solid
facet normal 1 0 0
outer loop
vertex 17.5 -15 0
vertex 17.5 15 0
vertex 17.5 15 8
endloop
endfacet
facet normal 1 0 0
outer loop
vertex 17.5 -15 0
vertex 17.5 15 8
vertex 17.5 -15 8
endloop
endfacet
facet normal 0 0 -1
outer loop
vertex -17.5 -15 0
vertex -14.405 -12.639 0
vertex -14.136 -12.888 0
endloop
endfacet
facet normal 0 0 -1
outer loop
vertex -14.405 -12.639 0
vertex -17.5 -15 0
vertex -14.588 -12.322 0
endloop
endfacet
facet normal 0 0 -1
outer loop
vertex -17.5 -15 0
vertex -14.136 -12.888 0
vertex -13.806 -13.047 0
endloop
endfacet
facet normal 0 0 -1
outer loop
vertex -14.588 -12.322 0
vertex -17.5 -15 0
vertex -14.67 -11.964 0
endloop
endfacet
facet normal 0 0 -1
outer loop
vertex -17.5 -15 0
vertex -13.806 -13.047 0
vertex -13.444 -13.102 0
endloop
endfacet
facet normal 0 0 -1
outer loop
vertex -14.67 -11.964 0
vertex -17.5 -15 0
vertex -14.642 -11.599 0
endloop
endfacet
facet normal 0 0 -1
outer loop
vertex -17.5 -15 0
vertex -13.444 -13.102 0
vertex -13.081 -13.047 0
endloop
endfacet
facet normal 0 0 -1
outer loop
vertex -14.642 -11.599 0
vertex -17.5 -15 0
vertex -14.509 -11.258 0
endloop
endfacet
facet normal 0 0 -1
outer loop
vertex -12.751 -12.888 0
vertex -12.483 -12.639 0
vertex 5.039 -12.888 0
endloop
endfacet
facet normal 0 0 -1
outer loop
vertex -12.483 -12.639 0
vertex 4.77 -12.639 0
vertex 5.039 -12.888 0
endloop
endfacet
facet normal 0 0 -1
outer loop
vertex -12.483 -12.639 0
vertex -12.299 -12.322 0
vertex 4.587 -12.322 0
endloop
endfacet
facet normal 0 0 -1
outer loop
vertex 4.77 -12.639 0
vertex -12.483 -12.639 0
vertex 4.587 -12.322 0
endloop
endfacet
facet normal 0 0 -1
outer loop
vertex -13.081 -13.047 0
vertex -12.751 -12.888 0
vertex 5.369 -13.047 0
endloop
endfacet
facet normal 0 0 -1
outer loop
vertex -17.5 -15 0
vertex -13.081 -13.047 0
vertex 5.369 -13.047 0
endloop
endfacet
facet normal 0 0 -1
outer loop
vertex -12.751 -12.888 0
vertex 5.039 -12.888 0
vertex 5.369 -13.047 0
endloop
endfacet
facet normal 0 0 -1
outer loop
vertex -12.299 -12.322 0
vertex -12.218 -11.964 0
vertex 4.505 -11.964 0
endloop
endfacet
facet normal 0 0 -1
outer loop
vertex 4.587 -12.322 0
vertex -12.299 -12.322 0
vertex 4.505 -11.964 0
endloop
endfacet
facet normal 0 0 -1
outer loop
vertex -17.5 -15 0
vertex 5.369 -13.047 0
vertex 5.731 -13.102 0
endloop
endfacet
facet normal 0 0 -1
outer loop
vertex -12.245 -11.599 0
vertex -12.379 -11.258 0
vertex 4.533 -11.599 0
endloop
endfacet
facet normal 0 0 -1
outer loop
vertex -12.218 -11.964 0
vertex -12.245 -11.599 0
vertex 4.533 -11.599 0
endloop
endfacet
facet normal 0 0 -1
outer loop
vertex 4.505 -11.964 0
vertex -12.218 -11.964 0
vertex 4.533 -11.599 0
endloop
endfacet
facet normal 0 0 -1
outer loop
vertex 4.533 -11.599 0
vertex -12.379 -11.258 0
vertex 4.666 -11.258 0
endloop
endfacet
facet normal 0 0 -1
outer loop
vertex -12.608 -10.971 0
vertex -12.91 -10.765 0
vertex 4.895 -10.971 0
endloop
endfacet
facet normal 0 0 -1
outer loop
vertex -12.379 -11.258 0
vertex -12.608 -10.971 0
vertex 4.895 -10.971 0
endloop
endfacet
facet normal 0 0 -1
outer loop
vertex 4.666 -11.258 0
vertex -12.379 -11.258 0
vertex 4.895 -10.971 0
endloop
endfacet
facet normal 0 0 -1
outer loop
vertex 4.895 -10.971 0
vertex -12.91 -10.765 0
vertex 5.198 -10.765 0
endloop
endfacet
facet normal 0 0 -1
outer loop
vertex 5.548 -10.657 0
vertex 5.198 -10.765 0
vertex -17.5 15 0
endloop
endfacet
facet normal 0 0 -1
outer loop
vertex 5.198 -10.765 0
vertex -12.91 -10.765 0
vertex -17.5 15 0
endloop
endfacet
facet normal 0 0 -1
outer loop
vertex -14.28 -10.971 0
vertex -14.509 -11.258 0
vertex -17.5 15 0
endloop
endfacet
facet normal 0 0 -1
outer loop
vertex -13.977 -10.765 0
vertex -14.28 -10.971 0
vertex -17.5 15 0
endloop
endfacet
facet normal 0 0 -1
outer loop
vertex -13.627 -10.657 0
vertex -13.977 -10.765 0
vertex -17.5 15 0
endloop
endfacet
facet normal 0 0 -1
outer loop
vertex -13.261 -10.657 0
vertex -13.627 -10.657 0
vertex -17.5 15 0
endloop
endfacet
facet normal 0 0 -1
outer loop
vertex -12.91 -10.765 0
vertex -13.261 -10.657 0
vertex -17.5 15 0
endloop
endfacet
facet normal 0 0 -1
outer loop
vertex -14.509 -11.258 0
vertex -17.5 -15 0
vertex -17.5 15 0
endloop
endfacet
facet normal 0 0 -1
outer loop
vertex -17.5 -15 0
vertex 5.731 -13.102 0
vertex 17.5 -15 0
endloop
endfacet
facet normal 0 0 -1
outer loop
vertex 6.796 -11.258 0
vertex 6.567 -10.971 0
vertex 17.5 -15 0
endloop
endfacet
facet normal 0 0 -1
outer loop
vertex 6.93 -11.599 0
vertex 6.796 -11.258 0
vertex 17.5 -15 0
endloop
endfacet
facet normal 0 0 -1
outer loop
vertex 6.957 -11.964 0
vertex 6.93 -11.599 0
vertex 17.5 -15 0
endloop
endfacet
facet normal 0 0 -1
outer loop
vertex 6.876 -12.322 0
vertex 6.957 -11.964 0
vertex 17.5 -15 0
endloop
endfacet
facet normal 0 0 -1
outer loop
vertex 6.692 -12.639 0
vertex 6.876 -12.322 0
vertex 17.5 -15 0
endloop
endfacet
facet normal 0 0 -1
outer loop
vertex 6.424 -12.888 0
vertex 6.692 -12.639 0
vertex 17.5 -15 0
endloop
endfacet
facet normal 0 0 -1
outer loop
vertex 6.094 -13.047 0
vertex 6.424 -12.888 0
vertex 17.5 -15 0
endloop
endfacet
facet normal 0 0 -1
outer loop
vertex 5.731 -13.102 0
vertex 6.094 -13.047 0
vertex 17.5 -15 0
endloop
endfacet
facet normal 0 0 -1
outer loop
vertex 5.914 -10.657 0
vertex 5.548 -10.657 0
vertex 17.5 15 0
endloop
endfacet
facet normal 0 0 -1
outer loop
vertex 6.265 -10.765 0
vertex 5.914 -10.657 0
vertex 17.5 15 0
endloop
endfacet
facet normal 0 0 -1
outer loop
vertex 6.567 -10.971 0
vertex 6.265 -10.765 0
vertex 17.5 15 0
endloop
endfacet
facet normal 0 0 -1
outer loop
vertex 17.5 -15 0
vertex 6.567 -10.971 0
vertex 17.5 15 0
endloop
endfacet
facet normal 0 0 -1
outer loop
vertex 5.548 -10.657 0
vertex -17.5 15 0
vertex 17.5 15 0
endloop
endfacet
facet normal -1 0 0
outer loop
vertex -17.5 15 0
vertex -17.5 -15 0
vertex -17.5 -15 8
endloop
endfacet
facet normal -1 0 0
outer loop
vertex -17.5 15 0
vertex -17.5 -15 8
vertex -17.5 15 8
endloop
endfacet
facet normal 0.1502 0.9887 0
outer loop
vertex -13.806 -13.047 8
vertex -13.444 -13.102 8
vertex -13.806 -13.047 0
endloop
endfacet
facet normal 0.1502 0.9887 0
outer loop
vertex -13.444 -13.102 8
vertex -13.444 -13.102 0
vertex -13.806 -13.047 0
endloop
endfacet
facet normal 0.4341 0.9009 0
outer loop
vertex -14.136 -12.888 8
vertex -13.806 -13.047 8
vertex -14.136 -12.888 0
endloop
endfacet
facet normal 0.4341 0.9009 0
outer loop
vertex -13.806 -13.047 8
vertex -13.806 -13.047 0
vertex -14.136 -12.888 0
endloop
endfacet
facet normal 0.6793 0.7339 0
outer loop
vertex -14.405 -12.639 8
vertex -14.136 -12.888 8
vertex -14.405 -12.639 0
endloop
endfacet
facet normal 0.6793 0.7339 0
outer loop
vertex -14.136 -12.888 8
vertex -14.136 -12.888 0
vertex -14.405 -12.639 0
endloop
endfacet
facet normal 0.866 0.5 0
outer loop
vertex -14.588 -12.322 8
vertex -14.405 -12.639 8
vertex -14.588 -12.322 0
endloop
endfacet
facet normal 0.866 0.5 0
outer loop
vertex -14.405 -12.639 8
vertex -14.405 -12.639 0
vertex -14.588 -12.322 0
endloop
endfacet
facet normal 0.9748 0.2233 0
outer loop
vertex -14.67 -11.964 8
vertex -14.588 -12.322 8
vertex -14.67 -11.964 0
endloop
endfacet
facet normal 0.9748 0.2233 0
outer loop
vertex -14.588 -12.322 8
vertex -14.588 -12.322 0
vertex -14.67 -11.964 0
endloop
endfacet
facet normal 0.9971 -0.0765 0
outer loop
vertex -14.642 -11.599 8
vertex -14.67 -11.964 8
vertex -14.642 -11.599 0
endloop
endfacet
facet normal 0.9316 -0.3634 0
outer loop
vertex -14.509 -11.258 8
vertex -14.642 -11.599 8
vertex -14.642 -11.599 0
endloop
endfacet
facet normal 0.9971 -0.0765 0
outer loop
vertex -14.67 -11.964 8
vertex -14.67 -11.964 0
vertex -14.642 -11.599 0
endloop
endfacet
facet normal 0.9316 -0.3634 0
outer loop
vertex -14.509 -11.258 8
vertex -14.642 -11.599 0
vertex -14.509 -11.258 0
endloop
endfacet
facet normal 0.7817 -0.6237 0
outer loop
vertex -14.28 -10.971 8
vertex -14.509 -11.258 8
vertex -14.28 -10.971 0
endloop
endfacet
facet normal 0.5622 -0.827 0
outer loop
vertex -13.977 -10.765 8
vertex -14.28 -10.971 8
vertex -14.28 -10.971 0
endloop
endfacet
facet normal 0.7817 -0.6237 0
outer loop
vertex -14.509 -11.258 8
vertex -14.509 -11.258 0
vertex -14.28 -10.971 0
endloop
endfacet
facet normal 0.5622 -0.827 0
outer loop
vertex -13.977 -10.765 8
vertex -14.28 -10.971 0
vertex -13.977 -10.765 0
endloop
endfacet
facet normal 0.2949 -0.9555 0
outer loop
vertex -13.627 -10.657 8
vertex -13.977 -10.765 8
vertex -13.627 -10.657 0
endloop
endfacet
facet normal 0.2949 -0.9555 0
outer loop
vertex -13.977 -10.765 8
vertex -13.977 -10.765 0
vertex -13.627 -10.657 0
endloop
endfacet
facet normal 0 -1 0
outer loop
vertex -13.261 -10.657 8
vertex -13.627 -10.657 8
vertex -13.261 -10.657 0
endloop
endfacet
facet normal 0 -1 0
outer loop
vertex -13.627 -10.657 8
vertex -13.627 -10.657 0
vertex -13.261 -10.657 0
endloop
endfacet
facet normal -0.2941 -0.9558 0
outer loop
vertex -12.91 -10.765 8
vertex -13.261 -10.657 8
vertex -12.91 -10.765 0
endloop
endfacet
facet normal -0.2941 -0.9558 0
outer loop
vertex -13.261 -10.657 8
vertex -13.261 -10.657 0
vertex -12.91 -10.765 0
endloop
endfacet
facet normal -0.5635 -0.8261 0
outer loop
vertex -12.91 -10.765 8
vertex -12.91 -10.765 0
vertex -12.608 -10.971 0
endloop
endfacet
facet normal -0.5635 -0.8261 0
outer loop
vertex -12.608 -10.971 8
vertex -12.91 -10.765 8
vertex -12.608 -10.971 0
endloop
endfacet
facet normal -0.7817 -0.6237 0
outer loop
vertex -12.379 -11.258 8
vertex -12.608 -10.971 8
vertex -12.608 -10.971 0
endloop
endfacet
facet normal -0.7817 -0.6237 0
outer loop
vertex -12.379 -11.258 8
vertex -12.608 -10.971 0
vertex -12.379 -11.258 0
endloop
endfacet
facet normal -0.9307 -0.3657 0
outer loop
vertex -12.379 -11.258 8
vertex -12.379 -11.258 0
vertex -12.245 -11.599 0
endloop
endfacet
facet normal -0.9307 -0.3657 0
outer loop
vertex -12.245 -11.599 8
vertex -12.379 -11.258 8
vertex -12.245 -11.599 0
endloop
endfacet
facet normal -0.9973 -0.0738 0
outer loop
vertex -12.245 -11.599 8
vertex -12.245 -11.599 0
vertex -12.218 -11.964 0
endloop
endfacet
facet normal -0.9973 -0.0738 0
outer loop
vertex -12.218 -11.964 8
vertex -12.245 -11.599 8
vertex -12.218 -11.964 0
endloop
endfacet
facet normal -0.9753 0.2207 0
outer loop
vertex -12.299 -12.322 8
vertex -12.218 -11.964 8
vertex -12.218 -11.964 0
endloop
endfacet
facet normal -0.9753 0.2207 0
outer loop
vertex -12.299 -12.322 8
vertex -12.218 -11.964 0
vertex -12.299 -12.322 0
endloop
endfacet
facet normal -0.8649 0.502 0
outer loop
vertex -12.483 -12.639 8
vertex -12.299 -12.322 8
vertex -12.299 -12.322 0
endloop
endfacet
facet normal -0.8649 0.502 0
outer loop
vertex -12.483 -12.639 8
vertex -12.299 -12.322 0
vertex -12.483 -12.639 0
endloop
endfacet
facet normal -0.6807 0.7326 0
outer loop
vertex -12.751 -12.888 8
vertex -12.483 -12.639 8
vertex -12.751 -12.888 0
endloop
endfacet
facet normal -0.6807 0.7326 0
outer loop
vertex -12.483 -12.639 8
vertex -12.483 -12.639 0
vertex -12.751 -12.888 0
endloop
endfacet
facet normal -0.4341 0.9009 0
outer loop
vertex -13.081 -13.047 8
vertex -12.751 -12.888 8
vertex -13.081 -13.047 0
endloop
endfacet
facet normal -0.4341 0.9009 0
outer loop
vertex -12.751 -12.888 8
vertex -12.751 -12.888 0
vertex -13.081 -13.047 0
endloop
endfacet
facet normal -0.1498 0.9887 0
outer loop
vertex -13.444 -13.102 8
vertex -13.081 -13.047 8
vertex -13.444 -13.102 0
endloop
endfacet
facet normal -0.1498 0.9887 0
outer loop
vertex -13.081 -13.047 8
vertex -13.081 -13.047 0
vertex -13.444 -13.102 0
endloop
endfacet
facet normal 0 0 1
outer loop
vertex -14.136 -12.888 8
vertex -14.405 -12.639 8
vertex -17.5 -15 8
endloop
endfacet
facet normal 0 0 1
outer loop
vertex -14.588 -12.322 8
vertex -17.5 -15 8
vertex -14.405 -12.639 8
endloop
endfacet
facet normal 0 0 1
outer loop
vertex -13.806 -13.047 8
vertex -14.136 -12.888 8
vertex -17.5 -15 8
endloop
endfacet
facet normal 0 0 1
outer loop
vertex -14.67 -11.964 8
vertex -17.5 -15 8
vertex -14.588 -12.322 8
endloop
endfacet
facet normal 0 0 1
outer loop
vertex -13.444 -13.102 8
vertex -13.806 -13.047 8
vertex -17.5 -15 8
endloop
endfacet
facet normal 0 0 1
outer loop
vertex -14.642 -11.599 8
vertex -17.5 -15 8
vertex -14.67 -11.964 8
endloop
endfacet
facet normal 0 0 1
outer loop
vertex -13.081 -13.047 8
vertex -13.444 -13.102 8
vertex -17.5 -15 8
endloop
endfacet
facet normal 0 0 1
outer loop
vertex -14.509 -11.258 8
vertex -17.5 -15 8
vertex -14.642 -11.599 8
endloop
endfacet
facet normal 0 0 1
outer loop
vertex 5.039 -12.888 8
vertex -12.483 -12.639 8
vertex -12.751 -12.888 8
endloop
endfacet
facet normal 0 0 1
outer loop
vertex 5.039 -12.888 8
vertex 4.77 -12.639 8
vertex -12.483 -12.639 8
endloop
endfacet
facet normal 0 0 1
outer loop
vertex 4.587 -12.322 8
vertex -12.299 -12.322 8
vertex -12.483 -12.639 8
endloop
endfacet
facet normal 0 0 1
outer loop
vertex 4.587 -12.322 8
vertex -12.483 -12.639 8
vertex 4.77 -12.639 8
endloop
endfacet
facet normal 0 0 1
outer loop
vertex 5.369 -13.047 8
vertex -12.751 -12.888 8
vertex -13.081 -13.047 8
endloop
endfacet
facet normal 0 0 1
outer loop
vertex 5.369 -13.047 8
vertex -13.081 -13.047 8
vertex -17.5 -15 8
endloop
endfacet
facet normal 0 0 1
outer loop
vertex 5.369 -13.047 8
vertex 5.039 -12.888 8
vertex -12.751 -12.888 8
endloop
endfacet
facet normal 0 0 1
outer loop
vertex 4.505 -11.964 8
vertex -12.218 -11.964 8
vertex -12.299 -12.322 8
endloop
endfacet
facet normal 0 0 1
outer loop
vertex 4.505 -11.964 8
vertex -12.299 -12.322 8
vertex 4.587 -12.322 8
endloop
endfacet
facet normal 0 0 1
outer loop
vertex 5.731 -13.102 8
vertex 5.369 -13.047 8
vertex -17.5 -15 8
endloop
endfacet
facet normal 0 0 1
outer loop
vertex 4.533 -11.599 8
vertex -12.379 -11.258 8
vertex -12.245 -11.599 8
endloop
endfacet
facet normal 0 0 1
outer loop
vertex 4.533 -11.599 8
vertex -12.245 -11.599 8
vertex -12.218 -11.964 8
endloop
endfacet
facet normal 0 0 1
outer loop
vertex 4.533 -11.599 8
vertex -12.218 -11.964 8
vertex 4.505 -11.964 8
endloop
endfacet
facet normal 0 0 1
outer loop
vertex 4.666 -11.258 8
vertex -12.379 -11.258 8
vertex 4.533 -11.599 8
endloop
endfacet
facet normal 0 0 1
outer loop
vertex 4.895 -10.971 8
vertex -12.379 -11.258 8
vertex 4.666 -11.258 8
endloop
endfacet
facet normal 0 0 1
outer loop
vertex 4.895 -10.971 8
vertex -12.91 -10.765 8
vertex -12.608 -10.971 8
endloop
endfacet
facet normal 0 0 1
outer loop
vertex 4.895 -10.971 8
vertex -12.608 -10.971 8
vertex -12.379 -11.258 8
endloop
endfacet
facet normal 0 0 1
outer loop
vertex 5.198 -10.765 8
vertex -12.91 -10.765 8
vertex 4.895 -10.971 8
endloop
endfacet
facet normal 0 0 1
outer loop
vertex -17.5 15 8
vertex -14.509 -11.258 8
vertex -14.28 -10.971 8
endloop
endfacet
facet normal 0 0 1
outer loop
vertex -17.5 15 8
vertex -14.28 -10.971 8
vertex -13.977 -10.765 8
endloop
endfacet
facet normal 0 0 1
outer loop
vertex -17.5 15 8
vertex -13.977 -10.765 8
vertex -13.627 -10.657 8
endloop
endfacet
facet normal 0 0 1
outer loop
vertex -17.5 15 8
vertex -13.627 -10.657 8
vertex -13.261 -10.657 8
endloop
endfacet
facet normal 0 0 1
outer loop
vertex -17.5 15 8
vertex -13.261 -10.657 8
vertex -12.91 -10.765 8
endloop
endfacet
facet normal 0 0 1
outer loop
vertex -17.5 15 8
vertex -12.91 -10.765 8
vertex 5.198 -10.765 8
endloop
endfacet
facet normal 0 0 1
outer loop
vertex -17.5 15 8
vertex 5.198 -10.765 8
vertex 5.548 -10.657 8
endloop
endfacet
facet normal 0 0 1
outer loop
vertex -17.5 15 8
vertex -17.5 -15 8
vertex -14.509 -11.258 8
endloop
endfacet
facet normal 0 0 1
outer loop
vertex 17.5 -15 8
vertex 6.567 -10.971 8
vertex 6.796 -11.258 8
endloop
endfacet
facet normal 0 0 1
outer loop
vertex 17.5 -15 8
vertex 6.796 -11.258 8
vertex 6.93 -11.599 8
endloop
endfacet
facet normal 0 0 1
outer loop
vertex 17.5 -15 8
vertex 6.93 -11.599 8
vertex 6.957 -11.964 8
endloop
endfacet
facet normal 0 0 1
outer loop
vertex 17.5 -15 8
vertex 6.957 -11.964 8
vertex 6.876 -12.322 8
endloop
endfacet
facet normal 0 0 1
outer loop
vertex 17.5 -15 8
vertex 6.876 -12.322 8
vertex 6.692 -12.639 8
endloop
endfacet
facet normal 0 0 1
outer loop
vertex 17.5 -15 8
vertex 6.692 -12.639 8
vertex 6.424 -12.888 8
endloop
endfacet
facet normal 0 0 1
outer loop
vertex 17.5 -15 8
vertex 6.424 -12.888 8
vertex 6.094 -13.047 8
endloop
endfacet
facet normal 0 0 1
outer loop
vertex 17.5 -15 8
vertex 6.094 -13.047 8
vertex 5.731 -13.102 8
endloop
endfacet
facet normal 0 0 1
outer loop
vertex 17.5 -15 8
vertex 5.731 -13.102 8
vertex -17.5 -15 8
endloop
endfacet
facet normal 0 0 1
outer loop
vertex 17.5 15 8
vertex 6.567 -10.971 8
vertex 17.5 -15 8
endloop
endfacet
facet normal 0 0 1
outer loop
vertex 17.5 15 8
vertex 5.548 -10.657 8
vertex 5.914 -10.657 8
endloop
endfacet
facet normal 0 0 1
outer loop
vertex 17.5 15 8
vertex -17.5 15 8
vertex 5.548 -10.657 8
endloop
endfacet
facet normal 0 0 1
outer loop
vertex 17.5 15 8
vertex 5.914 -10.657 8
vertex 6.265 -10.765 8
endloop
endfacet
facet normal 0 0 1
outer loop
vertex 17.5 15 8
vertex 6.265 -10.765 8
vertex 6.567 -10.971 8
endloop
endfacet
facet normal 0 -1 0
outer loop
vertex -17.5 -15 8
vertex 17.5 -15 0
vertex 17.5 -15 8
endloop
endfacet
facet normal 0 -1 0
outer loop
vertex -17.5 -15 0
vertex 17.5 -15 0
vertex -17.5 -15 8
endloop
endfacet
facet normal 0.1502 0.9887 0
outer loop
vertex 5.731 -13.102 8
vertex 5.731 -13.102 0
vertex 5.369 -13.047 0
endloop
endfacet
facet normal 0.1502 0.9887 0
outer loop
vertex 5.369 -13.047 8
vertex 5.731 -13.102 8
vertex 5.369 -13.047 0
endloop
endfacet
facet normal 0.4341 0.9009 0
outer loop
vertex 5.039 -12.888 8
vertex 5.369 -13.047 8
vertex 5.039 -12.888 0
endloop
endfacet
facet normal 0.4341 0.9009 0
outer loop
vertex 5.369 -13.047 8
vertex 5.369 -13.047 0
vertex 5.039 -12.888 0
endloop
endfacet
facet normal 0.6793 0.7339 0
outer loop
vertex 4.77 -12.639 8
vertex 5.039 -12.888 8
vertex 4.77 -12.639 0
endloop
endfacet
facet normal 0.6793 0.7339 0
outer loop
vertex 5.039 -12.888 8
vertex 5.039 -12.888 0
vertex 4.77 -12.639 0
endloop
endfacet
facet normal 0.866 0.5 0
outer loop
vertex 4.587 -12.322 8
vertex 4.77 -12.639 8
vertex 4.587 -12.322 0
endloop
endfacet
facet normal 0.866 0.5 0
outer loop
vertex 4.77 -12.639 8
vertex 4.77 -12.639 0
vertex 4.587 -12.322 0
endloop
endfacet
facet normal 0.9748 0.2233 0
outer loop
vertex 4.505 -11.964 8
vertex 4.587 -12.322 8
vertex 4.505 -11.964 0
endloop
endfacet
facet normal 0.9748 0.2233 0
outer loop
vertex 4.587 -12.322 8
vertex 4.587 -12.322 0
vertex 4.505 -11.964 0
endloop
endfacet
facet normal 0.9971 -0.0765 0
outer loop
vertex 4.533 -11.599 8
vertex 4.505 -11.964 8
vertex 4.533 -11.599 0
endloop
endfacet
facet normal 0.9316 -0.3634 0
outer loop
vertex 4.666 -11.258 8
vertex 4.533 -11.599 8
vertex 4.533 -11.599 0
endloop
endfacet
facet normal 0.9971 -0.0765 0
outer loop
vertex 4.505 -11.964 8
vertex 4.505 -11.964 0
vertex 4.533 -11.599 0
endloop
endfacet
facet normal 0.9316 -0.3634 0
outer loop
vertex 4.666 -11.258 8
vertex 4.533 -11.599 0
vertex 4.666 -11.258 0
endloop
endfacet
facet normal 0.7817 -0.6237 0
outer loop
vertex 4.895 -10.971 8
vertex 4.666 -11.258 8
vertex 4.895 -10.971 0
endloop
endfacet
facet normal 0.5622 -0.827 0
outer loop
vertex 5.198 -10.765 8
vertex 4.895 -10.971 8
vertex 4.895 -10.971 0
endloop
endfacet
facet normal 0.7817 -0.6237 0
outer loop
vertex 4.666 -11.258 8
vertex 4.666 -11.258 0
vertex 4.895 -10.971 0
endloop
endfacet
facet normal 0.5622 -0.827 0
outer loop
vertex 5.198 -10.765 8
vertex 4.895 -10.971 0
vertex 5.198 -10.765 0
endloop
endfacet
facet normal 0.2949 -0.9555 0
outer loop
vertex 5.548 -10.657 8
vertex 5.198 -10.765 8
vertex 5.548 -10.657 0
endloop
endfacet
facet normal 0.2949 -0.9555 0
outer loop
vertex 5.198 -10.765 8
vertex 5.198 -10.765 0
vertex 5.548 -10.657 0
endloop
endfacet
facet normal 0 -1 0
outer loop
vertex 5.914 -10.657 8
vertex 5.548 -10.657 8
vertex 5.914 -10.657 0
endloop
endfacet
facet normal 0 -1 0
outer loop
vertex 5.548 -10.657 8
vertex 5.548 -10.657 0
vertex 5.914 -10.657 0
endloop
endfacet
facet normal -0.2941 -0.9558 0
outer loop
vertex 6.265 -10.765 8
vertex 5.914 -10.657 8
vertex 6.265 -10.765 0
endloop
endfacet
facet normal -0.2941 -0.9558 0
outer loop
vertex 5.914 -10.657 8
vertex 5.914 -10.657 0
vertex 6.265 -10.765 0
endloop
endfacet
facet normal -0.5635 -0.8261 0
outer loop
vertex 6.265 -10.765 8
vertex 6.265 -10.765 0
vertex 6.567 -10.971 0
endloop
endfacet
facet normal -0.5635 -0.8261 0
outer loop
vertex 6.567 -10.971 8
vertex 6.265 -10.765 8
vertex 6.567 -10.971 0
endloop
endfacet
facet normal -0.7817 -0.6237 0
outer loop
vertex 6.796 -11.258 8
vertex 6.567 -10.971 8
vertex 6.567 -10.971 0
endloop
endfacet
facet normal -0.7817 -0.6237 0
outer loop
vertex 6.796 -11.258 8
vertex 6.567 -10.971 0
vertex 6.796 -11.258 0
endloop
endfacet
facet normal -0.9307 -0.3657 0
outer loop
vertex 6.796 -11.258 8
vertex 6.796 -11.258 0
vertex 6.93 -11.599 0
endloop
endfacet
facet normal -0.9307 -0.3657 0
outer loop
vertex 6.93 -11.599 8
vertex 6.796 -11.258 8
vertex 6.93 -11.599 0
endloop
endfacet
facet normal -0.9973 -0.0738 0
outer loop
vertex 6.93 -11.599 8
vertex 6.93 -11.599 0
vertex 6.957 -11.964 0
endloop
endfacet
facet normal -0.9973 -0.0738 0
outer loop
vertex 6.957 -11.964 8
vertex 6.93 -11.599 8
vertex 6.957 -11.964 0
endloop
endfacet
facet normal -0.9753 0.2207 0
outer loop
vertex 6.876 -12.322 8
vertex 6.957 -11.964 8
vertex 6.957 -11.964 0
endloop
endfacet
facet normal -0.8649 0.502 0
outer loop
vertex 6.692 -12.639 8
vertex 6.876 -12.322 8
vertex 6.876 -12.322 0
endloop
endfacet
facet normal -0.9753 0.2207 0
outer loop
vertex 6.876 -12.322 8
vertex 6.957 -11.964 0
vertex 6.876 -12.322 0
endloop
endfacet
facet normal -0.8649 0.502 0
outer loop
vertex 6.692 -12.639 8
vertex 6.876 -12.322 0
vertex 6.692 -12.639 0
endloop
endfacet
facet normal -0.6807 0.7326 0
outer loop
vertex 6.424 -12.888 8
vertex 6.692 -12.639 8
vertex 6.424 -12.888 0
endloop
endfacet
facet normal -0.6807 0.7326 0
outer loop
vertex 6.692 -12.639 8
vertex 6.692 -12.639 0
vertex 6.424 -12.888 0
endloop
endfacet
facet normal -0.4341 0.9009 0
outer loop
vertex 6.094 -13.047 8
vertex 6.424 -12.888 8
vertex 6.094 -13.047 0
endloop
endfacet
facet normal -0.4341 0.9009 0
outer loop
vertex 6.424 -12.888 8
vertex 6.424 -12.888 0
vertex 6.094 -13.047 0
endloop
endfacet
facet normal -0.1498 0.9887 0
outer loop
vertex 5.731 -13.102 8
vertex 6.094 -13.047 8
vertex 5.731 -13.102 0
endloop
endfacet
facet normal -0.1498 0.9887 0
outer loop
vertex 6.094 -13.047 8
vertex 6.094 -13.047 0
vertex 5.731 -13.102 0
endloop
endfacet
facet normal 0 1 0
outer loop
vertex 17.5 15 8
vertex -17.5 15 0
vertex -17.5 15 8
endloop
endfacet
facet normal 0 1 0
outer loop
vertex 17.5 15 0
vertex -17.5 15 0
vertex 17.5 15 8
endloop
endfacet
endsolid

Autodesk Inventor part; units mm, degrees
ref_plane "YZ Plane" through (0, 0, 0) normal (1, 0, 0) x (0, 1, 0)
ref_plane "XZ Plane" through (0, 0, 0) normal (0, 1, 0) x (-1, 0, 0)
ref_plane "XY Plane" through (0, 0, 0) normal (0, 0, 1) x (1, 0, 0)
sketch "Sketch1" plane through (0, 0, 0) normal (0, 0, 1) x (1, 0, 0)
  line L0 (-17.5, 15) -> (17.5, 15)
  line L1 (17.5, 15) -> (17.5, -15)
  line L2 (17.5, -15) -> (-17.5, -15)
  line L3 (-17.5, -15) -> (-17.5, 15)
  point P0 (0, 0)
  point P1 (0, 15)
  point P2 (-17.5, 0)
  dimension "d0" = 35
  dimension "d1" = 30
extrude "Extrusion1" add sketch "Sketch1" along normal blind 8
sketch "Sketch6" plane through (0, 0, 8) normal (0, 0, 1) x (1, 0, 0)
  circle A0 centre (5.7312, -11.8725) radius 1.7875 projected
  circle A1 centre (-13.4438, -11.8725) radius 1.7875 projected
  point P0 (0, 0)
hole "Hole1" at (5.7312, -11.8725, 8) at (-13.4438, -11.8725, 8) direction (0, 0, -1) diameter 2.459 end through all thread size "M3x0.5" class "6H" standard "ISO Metric profile"
properties part number "0005-10-028 suport senzor y"
